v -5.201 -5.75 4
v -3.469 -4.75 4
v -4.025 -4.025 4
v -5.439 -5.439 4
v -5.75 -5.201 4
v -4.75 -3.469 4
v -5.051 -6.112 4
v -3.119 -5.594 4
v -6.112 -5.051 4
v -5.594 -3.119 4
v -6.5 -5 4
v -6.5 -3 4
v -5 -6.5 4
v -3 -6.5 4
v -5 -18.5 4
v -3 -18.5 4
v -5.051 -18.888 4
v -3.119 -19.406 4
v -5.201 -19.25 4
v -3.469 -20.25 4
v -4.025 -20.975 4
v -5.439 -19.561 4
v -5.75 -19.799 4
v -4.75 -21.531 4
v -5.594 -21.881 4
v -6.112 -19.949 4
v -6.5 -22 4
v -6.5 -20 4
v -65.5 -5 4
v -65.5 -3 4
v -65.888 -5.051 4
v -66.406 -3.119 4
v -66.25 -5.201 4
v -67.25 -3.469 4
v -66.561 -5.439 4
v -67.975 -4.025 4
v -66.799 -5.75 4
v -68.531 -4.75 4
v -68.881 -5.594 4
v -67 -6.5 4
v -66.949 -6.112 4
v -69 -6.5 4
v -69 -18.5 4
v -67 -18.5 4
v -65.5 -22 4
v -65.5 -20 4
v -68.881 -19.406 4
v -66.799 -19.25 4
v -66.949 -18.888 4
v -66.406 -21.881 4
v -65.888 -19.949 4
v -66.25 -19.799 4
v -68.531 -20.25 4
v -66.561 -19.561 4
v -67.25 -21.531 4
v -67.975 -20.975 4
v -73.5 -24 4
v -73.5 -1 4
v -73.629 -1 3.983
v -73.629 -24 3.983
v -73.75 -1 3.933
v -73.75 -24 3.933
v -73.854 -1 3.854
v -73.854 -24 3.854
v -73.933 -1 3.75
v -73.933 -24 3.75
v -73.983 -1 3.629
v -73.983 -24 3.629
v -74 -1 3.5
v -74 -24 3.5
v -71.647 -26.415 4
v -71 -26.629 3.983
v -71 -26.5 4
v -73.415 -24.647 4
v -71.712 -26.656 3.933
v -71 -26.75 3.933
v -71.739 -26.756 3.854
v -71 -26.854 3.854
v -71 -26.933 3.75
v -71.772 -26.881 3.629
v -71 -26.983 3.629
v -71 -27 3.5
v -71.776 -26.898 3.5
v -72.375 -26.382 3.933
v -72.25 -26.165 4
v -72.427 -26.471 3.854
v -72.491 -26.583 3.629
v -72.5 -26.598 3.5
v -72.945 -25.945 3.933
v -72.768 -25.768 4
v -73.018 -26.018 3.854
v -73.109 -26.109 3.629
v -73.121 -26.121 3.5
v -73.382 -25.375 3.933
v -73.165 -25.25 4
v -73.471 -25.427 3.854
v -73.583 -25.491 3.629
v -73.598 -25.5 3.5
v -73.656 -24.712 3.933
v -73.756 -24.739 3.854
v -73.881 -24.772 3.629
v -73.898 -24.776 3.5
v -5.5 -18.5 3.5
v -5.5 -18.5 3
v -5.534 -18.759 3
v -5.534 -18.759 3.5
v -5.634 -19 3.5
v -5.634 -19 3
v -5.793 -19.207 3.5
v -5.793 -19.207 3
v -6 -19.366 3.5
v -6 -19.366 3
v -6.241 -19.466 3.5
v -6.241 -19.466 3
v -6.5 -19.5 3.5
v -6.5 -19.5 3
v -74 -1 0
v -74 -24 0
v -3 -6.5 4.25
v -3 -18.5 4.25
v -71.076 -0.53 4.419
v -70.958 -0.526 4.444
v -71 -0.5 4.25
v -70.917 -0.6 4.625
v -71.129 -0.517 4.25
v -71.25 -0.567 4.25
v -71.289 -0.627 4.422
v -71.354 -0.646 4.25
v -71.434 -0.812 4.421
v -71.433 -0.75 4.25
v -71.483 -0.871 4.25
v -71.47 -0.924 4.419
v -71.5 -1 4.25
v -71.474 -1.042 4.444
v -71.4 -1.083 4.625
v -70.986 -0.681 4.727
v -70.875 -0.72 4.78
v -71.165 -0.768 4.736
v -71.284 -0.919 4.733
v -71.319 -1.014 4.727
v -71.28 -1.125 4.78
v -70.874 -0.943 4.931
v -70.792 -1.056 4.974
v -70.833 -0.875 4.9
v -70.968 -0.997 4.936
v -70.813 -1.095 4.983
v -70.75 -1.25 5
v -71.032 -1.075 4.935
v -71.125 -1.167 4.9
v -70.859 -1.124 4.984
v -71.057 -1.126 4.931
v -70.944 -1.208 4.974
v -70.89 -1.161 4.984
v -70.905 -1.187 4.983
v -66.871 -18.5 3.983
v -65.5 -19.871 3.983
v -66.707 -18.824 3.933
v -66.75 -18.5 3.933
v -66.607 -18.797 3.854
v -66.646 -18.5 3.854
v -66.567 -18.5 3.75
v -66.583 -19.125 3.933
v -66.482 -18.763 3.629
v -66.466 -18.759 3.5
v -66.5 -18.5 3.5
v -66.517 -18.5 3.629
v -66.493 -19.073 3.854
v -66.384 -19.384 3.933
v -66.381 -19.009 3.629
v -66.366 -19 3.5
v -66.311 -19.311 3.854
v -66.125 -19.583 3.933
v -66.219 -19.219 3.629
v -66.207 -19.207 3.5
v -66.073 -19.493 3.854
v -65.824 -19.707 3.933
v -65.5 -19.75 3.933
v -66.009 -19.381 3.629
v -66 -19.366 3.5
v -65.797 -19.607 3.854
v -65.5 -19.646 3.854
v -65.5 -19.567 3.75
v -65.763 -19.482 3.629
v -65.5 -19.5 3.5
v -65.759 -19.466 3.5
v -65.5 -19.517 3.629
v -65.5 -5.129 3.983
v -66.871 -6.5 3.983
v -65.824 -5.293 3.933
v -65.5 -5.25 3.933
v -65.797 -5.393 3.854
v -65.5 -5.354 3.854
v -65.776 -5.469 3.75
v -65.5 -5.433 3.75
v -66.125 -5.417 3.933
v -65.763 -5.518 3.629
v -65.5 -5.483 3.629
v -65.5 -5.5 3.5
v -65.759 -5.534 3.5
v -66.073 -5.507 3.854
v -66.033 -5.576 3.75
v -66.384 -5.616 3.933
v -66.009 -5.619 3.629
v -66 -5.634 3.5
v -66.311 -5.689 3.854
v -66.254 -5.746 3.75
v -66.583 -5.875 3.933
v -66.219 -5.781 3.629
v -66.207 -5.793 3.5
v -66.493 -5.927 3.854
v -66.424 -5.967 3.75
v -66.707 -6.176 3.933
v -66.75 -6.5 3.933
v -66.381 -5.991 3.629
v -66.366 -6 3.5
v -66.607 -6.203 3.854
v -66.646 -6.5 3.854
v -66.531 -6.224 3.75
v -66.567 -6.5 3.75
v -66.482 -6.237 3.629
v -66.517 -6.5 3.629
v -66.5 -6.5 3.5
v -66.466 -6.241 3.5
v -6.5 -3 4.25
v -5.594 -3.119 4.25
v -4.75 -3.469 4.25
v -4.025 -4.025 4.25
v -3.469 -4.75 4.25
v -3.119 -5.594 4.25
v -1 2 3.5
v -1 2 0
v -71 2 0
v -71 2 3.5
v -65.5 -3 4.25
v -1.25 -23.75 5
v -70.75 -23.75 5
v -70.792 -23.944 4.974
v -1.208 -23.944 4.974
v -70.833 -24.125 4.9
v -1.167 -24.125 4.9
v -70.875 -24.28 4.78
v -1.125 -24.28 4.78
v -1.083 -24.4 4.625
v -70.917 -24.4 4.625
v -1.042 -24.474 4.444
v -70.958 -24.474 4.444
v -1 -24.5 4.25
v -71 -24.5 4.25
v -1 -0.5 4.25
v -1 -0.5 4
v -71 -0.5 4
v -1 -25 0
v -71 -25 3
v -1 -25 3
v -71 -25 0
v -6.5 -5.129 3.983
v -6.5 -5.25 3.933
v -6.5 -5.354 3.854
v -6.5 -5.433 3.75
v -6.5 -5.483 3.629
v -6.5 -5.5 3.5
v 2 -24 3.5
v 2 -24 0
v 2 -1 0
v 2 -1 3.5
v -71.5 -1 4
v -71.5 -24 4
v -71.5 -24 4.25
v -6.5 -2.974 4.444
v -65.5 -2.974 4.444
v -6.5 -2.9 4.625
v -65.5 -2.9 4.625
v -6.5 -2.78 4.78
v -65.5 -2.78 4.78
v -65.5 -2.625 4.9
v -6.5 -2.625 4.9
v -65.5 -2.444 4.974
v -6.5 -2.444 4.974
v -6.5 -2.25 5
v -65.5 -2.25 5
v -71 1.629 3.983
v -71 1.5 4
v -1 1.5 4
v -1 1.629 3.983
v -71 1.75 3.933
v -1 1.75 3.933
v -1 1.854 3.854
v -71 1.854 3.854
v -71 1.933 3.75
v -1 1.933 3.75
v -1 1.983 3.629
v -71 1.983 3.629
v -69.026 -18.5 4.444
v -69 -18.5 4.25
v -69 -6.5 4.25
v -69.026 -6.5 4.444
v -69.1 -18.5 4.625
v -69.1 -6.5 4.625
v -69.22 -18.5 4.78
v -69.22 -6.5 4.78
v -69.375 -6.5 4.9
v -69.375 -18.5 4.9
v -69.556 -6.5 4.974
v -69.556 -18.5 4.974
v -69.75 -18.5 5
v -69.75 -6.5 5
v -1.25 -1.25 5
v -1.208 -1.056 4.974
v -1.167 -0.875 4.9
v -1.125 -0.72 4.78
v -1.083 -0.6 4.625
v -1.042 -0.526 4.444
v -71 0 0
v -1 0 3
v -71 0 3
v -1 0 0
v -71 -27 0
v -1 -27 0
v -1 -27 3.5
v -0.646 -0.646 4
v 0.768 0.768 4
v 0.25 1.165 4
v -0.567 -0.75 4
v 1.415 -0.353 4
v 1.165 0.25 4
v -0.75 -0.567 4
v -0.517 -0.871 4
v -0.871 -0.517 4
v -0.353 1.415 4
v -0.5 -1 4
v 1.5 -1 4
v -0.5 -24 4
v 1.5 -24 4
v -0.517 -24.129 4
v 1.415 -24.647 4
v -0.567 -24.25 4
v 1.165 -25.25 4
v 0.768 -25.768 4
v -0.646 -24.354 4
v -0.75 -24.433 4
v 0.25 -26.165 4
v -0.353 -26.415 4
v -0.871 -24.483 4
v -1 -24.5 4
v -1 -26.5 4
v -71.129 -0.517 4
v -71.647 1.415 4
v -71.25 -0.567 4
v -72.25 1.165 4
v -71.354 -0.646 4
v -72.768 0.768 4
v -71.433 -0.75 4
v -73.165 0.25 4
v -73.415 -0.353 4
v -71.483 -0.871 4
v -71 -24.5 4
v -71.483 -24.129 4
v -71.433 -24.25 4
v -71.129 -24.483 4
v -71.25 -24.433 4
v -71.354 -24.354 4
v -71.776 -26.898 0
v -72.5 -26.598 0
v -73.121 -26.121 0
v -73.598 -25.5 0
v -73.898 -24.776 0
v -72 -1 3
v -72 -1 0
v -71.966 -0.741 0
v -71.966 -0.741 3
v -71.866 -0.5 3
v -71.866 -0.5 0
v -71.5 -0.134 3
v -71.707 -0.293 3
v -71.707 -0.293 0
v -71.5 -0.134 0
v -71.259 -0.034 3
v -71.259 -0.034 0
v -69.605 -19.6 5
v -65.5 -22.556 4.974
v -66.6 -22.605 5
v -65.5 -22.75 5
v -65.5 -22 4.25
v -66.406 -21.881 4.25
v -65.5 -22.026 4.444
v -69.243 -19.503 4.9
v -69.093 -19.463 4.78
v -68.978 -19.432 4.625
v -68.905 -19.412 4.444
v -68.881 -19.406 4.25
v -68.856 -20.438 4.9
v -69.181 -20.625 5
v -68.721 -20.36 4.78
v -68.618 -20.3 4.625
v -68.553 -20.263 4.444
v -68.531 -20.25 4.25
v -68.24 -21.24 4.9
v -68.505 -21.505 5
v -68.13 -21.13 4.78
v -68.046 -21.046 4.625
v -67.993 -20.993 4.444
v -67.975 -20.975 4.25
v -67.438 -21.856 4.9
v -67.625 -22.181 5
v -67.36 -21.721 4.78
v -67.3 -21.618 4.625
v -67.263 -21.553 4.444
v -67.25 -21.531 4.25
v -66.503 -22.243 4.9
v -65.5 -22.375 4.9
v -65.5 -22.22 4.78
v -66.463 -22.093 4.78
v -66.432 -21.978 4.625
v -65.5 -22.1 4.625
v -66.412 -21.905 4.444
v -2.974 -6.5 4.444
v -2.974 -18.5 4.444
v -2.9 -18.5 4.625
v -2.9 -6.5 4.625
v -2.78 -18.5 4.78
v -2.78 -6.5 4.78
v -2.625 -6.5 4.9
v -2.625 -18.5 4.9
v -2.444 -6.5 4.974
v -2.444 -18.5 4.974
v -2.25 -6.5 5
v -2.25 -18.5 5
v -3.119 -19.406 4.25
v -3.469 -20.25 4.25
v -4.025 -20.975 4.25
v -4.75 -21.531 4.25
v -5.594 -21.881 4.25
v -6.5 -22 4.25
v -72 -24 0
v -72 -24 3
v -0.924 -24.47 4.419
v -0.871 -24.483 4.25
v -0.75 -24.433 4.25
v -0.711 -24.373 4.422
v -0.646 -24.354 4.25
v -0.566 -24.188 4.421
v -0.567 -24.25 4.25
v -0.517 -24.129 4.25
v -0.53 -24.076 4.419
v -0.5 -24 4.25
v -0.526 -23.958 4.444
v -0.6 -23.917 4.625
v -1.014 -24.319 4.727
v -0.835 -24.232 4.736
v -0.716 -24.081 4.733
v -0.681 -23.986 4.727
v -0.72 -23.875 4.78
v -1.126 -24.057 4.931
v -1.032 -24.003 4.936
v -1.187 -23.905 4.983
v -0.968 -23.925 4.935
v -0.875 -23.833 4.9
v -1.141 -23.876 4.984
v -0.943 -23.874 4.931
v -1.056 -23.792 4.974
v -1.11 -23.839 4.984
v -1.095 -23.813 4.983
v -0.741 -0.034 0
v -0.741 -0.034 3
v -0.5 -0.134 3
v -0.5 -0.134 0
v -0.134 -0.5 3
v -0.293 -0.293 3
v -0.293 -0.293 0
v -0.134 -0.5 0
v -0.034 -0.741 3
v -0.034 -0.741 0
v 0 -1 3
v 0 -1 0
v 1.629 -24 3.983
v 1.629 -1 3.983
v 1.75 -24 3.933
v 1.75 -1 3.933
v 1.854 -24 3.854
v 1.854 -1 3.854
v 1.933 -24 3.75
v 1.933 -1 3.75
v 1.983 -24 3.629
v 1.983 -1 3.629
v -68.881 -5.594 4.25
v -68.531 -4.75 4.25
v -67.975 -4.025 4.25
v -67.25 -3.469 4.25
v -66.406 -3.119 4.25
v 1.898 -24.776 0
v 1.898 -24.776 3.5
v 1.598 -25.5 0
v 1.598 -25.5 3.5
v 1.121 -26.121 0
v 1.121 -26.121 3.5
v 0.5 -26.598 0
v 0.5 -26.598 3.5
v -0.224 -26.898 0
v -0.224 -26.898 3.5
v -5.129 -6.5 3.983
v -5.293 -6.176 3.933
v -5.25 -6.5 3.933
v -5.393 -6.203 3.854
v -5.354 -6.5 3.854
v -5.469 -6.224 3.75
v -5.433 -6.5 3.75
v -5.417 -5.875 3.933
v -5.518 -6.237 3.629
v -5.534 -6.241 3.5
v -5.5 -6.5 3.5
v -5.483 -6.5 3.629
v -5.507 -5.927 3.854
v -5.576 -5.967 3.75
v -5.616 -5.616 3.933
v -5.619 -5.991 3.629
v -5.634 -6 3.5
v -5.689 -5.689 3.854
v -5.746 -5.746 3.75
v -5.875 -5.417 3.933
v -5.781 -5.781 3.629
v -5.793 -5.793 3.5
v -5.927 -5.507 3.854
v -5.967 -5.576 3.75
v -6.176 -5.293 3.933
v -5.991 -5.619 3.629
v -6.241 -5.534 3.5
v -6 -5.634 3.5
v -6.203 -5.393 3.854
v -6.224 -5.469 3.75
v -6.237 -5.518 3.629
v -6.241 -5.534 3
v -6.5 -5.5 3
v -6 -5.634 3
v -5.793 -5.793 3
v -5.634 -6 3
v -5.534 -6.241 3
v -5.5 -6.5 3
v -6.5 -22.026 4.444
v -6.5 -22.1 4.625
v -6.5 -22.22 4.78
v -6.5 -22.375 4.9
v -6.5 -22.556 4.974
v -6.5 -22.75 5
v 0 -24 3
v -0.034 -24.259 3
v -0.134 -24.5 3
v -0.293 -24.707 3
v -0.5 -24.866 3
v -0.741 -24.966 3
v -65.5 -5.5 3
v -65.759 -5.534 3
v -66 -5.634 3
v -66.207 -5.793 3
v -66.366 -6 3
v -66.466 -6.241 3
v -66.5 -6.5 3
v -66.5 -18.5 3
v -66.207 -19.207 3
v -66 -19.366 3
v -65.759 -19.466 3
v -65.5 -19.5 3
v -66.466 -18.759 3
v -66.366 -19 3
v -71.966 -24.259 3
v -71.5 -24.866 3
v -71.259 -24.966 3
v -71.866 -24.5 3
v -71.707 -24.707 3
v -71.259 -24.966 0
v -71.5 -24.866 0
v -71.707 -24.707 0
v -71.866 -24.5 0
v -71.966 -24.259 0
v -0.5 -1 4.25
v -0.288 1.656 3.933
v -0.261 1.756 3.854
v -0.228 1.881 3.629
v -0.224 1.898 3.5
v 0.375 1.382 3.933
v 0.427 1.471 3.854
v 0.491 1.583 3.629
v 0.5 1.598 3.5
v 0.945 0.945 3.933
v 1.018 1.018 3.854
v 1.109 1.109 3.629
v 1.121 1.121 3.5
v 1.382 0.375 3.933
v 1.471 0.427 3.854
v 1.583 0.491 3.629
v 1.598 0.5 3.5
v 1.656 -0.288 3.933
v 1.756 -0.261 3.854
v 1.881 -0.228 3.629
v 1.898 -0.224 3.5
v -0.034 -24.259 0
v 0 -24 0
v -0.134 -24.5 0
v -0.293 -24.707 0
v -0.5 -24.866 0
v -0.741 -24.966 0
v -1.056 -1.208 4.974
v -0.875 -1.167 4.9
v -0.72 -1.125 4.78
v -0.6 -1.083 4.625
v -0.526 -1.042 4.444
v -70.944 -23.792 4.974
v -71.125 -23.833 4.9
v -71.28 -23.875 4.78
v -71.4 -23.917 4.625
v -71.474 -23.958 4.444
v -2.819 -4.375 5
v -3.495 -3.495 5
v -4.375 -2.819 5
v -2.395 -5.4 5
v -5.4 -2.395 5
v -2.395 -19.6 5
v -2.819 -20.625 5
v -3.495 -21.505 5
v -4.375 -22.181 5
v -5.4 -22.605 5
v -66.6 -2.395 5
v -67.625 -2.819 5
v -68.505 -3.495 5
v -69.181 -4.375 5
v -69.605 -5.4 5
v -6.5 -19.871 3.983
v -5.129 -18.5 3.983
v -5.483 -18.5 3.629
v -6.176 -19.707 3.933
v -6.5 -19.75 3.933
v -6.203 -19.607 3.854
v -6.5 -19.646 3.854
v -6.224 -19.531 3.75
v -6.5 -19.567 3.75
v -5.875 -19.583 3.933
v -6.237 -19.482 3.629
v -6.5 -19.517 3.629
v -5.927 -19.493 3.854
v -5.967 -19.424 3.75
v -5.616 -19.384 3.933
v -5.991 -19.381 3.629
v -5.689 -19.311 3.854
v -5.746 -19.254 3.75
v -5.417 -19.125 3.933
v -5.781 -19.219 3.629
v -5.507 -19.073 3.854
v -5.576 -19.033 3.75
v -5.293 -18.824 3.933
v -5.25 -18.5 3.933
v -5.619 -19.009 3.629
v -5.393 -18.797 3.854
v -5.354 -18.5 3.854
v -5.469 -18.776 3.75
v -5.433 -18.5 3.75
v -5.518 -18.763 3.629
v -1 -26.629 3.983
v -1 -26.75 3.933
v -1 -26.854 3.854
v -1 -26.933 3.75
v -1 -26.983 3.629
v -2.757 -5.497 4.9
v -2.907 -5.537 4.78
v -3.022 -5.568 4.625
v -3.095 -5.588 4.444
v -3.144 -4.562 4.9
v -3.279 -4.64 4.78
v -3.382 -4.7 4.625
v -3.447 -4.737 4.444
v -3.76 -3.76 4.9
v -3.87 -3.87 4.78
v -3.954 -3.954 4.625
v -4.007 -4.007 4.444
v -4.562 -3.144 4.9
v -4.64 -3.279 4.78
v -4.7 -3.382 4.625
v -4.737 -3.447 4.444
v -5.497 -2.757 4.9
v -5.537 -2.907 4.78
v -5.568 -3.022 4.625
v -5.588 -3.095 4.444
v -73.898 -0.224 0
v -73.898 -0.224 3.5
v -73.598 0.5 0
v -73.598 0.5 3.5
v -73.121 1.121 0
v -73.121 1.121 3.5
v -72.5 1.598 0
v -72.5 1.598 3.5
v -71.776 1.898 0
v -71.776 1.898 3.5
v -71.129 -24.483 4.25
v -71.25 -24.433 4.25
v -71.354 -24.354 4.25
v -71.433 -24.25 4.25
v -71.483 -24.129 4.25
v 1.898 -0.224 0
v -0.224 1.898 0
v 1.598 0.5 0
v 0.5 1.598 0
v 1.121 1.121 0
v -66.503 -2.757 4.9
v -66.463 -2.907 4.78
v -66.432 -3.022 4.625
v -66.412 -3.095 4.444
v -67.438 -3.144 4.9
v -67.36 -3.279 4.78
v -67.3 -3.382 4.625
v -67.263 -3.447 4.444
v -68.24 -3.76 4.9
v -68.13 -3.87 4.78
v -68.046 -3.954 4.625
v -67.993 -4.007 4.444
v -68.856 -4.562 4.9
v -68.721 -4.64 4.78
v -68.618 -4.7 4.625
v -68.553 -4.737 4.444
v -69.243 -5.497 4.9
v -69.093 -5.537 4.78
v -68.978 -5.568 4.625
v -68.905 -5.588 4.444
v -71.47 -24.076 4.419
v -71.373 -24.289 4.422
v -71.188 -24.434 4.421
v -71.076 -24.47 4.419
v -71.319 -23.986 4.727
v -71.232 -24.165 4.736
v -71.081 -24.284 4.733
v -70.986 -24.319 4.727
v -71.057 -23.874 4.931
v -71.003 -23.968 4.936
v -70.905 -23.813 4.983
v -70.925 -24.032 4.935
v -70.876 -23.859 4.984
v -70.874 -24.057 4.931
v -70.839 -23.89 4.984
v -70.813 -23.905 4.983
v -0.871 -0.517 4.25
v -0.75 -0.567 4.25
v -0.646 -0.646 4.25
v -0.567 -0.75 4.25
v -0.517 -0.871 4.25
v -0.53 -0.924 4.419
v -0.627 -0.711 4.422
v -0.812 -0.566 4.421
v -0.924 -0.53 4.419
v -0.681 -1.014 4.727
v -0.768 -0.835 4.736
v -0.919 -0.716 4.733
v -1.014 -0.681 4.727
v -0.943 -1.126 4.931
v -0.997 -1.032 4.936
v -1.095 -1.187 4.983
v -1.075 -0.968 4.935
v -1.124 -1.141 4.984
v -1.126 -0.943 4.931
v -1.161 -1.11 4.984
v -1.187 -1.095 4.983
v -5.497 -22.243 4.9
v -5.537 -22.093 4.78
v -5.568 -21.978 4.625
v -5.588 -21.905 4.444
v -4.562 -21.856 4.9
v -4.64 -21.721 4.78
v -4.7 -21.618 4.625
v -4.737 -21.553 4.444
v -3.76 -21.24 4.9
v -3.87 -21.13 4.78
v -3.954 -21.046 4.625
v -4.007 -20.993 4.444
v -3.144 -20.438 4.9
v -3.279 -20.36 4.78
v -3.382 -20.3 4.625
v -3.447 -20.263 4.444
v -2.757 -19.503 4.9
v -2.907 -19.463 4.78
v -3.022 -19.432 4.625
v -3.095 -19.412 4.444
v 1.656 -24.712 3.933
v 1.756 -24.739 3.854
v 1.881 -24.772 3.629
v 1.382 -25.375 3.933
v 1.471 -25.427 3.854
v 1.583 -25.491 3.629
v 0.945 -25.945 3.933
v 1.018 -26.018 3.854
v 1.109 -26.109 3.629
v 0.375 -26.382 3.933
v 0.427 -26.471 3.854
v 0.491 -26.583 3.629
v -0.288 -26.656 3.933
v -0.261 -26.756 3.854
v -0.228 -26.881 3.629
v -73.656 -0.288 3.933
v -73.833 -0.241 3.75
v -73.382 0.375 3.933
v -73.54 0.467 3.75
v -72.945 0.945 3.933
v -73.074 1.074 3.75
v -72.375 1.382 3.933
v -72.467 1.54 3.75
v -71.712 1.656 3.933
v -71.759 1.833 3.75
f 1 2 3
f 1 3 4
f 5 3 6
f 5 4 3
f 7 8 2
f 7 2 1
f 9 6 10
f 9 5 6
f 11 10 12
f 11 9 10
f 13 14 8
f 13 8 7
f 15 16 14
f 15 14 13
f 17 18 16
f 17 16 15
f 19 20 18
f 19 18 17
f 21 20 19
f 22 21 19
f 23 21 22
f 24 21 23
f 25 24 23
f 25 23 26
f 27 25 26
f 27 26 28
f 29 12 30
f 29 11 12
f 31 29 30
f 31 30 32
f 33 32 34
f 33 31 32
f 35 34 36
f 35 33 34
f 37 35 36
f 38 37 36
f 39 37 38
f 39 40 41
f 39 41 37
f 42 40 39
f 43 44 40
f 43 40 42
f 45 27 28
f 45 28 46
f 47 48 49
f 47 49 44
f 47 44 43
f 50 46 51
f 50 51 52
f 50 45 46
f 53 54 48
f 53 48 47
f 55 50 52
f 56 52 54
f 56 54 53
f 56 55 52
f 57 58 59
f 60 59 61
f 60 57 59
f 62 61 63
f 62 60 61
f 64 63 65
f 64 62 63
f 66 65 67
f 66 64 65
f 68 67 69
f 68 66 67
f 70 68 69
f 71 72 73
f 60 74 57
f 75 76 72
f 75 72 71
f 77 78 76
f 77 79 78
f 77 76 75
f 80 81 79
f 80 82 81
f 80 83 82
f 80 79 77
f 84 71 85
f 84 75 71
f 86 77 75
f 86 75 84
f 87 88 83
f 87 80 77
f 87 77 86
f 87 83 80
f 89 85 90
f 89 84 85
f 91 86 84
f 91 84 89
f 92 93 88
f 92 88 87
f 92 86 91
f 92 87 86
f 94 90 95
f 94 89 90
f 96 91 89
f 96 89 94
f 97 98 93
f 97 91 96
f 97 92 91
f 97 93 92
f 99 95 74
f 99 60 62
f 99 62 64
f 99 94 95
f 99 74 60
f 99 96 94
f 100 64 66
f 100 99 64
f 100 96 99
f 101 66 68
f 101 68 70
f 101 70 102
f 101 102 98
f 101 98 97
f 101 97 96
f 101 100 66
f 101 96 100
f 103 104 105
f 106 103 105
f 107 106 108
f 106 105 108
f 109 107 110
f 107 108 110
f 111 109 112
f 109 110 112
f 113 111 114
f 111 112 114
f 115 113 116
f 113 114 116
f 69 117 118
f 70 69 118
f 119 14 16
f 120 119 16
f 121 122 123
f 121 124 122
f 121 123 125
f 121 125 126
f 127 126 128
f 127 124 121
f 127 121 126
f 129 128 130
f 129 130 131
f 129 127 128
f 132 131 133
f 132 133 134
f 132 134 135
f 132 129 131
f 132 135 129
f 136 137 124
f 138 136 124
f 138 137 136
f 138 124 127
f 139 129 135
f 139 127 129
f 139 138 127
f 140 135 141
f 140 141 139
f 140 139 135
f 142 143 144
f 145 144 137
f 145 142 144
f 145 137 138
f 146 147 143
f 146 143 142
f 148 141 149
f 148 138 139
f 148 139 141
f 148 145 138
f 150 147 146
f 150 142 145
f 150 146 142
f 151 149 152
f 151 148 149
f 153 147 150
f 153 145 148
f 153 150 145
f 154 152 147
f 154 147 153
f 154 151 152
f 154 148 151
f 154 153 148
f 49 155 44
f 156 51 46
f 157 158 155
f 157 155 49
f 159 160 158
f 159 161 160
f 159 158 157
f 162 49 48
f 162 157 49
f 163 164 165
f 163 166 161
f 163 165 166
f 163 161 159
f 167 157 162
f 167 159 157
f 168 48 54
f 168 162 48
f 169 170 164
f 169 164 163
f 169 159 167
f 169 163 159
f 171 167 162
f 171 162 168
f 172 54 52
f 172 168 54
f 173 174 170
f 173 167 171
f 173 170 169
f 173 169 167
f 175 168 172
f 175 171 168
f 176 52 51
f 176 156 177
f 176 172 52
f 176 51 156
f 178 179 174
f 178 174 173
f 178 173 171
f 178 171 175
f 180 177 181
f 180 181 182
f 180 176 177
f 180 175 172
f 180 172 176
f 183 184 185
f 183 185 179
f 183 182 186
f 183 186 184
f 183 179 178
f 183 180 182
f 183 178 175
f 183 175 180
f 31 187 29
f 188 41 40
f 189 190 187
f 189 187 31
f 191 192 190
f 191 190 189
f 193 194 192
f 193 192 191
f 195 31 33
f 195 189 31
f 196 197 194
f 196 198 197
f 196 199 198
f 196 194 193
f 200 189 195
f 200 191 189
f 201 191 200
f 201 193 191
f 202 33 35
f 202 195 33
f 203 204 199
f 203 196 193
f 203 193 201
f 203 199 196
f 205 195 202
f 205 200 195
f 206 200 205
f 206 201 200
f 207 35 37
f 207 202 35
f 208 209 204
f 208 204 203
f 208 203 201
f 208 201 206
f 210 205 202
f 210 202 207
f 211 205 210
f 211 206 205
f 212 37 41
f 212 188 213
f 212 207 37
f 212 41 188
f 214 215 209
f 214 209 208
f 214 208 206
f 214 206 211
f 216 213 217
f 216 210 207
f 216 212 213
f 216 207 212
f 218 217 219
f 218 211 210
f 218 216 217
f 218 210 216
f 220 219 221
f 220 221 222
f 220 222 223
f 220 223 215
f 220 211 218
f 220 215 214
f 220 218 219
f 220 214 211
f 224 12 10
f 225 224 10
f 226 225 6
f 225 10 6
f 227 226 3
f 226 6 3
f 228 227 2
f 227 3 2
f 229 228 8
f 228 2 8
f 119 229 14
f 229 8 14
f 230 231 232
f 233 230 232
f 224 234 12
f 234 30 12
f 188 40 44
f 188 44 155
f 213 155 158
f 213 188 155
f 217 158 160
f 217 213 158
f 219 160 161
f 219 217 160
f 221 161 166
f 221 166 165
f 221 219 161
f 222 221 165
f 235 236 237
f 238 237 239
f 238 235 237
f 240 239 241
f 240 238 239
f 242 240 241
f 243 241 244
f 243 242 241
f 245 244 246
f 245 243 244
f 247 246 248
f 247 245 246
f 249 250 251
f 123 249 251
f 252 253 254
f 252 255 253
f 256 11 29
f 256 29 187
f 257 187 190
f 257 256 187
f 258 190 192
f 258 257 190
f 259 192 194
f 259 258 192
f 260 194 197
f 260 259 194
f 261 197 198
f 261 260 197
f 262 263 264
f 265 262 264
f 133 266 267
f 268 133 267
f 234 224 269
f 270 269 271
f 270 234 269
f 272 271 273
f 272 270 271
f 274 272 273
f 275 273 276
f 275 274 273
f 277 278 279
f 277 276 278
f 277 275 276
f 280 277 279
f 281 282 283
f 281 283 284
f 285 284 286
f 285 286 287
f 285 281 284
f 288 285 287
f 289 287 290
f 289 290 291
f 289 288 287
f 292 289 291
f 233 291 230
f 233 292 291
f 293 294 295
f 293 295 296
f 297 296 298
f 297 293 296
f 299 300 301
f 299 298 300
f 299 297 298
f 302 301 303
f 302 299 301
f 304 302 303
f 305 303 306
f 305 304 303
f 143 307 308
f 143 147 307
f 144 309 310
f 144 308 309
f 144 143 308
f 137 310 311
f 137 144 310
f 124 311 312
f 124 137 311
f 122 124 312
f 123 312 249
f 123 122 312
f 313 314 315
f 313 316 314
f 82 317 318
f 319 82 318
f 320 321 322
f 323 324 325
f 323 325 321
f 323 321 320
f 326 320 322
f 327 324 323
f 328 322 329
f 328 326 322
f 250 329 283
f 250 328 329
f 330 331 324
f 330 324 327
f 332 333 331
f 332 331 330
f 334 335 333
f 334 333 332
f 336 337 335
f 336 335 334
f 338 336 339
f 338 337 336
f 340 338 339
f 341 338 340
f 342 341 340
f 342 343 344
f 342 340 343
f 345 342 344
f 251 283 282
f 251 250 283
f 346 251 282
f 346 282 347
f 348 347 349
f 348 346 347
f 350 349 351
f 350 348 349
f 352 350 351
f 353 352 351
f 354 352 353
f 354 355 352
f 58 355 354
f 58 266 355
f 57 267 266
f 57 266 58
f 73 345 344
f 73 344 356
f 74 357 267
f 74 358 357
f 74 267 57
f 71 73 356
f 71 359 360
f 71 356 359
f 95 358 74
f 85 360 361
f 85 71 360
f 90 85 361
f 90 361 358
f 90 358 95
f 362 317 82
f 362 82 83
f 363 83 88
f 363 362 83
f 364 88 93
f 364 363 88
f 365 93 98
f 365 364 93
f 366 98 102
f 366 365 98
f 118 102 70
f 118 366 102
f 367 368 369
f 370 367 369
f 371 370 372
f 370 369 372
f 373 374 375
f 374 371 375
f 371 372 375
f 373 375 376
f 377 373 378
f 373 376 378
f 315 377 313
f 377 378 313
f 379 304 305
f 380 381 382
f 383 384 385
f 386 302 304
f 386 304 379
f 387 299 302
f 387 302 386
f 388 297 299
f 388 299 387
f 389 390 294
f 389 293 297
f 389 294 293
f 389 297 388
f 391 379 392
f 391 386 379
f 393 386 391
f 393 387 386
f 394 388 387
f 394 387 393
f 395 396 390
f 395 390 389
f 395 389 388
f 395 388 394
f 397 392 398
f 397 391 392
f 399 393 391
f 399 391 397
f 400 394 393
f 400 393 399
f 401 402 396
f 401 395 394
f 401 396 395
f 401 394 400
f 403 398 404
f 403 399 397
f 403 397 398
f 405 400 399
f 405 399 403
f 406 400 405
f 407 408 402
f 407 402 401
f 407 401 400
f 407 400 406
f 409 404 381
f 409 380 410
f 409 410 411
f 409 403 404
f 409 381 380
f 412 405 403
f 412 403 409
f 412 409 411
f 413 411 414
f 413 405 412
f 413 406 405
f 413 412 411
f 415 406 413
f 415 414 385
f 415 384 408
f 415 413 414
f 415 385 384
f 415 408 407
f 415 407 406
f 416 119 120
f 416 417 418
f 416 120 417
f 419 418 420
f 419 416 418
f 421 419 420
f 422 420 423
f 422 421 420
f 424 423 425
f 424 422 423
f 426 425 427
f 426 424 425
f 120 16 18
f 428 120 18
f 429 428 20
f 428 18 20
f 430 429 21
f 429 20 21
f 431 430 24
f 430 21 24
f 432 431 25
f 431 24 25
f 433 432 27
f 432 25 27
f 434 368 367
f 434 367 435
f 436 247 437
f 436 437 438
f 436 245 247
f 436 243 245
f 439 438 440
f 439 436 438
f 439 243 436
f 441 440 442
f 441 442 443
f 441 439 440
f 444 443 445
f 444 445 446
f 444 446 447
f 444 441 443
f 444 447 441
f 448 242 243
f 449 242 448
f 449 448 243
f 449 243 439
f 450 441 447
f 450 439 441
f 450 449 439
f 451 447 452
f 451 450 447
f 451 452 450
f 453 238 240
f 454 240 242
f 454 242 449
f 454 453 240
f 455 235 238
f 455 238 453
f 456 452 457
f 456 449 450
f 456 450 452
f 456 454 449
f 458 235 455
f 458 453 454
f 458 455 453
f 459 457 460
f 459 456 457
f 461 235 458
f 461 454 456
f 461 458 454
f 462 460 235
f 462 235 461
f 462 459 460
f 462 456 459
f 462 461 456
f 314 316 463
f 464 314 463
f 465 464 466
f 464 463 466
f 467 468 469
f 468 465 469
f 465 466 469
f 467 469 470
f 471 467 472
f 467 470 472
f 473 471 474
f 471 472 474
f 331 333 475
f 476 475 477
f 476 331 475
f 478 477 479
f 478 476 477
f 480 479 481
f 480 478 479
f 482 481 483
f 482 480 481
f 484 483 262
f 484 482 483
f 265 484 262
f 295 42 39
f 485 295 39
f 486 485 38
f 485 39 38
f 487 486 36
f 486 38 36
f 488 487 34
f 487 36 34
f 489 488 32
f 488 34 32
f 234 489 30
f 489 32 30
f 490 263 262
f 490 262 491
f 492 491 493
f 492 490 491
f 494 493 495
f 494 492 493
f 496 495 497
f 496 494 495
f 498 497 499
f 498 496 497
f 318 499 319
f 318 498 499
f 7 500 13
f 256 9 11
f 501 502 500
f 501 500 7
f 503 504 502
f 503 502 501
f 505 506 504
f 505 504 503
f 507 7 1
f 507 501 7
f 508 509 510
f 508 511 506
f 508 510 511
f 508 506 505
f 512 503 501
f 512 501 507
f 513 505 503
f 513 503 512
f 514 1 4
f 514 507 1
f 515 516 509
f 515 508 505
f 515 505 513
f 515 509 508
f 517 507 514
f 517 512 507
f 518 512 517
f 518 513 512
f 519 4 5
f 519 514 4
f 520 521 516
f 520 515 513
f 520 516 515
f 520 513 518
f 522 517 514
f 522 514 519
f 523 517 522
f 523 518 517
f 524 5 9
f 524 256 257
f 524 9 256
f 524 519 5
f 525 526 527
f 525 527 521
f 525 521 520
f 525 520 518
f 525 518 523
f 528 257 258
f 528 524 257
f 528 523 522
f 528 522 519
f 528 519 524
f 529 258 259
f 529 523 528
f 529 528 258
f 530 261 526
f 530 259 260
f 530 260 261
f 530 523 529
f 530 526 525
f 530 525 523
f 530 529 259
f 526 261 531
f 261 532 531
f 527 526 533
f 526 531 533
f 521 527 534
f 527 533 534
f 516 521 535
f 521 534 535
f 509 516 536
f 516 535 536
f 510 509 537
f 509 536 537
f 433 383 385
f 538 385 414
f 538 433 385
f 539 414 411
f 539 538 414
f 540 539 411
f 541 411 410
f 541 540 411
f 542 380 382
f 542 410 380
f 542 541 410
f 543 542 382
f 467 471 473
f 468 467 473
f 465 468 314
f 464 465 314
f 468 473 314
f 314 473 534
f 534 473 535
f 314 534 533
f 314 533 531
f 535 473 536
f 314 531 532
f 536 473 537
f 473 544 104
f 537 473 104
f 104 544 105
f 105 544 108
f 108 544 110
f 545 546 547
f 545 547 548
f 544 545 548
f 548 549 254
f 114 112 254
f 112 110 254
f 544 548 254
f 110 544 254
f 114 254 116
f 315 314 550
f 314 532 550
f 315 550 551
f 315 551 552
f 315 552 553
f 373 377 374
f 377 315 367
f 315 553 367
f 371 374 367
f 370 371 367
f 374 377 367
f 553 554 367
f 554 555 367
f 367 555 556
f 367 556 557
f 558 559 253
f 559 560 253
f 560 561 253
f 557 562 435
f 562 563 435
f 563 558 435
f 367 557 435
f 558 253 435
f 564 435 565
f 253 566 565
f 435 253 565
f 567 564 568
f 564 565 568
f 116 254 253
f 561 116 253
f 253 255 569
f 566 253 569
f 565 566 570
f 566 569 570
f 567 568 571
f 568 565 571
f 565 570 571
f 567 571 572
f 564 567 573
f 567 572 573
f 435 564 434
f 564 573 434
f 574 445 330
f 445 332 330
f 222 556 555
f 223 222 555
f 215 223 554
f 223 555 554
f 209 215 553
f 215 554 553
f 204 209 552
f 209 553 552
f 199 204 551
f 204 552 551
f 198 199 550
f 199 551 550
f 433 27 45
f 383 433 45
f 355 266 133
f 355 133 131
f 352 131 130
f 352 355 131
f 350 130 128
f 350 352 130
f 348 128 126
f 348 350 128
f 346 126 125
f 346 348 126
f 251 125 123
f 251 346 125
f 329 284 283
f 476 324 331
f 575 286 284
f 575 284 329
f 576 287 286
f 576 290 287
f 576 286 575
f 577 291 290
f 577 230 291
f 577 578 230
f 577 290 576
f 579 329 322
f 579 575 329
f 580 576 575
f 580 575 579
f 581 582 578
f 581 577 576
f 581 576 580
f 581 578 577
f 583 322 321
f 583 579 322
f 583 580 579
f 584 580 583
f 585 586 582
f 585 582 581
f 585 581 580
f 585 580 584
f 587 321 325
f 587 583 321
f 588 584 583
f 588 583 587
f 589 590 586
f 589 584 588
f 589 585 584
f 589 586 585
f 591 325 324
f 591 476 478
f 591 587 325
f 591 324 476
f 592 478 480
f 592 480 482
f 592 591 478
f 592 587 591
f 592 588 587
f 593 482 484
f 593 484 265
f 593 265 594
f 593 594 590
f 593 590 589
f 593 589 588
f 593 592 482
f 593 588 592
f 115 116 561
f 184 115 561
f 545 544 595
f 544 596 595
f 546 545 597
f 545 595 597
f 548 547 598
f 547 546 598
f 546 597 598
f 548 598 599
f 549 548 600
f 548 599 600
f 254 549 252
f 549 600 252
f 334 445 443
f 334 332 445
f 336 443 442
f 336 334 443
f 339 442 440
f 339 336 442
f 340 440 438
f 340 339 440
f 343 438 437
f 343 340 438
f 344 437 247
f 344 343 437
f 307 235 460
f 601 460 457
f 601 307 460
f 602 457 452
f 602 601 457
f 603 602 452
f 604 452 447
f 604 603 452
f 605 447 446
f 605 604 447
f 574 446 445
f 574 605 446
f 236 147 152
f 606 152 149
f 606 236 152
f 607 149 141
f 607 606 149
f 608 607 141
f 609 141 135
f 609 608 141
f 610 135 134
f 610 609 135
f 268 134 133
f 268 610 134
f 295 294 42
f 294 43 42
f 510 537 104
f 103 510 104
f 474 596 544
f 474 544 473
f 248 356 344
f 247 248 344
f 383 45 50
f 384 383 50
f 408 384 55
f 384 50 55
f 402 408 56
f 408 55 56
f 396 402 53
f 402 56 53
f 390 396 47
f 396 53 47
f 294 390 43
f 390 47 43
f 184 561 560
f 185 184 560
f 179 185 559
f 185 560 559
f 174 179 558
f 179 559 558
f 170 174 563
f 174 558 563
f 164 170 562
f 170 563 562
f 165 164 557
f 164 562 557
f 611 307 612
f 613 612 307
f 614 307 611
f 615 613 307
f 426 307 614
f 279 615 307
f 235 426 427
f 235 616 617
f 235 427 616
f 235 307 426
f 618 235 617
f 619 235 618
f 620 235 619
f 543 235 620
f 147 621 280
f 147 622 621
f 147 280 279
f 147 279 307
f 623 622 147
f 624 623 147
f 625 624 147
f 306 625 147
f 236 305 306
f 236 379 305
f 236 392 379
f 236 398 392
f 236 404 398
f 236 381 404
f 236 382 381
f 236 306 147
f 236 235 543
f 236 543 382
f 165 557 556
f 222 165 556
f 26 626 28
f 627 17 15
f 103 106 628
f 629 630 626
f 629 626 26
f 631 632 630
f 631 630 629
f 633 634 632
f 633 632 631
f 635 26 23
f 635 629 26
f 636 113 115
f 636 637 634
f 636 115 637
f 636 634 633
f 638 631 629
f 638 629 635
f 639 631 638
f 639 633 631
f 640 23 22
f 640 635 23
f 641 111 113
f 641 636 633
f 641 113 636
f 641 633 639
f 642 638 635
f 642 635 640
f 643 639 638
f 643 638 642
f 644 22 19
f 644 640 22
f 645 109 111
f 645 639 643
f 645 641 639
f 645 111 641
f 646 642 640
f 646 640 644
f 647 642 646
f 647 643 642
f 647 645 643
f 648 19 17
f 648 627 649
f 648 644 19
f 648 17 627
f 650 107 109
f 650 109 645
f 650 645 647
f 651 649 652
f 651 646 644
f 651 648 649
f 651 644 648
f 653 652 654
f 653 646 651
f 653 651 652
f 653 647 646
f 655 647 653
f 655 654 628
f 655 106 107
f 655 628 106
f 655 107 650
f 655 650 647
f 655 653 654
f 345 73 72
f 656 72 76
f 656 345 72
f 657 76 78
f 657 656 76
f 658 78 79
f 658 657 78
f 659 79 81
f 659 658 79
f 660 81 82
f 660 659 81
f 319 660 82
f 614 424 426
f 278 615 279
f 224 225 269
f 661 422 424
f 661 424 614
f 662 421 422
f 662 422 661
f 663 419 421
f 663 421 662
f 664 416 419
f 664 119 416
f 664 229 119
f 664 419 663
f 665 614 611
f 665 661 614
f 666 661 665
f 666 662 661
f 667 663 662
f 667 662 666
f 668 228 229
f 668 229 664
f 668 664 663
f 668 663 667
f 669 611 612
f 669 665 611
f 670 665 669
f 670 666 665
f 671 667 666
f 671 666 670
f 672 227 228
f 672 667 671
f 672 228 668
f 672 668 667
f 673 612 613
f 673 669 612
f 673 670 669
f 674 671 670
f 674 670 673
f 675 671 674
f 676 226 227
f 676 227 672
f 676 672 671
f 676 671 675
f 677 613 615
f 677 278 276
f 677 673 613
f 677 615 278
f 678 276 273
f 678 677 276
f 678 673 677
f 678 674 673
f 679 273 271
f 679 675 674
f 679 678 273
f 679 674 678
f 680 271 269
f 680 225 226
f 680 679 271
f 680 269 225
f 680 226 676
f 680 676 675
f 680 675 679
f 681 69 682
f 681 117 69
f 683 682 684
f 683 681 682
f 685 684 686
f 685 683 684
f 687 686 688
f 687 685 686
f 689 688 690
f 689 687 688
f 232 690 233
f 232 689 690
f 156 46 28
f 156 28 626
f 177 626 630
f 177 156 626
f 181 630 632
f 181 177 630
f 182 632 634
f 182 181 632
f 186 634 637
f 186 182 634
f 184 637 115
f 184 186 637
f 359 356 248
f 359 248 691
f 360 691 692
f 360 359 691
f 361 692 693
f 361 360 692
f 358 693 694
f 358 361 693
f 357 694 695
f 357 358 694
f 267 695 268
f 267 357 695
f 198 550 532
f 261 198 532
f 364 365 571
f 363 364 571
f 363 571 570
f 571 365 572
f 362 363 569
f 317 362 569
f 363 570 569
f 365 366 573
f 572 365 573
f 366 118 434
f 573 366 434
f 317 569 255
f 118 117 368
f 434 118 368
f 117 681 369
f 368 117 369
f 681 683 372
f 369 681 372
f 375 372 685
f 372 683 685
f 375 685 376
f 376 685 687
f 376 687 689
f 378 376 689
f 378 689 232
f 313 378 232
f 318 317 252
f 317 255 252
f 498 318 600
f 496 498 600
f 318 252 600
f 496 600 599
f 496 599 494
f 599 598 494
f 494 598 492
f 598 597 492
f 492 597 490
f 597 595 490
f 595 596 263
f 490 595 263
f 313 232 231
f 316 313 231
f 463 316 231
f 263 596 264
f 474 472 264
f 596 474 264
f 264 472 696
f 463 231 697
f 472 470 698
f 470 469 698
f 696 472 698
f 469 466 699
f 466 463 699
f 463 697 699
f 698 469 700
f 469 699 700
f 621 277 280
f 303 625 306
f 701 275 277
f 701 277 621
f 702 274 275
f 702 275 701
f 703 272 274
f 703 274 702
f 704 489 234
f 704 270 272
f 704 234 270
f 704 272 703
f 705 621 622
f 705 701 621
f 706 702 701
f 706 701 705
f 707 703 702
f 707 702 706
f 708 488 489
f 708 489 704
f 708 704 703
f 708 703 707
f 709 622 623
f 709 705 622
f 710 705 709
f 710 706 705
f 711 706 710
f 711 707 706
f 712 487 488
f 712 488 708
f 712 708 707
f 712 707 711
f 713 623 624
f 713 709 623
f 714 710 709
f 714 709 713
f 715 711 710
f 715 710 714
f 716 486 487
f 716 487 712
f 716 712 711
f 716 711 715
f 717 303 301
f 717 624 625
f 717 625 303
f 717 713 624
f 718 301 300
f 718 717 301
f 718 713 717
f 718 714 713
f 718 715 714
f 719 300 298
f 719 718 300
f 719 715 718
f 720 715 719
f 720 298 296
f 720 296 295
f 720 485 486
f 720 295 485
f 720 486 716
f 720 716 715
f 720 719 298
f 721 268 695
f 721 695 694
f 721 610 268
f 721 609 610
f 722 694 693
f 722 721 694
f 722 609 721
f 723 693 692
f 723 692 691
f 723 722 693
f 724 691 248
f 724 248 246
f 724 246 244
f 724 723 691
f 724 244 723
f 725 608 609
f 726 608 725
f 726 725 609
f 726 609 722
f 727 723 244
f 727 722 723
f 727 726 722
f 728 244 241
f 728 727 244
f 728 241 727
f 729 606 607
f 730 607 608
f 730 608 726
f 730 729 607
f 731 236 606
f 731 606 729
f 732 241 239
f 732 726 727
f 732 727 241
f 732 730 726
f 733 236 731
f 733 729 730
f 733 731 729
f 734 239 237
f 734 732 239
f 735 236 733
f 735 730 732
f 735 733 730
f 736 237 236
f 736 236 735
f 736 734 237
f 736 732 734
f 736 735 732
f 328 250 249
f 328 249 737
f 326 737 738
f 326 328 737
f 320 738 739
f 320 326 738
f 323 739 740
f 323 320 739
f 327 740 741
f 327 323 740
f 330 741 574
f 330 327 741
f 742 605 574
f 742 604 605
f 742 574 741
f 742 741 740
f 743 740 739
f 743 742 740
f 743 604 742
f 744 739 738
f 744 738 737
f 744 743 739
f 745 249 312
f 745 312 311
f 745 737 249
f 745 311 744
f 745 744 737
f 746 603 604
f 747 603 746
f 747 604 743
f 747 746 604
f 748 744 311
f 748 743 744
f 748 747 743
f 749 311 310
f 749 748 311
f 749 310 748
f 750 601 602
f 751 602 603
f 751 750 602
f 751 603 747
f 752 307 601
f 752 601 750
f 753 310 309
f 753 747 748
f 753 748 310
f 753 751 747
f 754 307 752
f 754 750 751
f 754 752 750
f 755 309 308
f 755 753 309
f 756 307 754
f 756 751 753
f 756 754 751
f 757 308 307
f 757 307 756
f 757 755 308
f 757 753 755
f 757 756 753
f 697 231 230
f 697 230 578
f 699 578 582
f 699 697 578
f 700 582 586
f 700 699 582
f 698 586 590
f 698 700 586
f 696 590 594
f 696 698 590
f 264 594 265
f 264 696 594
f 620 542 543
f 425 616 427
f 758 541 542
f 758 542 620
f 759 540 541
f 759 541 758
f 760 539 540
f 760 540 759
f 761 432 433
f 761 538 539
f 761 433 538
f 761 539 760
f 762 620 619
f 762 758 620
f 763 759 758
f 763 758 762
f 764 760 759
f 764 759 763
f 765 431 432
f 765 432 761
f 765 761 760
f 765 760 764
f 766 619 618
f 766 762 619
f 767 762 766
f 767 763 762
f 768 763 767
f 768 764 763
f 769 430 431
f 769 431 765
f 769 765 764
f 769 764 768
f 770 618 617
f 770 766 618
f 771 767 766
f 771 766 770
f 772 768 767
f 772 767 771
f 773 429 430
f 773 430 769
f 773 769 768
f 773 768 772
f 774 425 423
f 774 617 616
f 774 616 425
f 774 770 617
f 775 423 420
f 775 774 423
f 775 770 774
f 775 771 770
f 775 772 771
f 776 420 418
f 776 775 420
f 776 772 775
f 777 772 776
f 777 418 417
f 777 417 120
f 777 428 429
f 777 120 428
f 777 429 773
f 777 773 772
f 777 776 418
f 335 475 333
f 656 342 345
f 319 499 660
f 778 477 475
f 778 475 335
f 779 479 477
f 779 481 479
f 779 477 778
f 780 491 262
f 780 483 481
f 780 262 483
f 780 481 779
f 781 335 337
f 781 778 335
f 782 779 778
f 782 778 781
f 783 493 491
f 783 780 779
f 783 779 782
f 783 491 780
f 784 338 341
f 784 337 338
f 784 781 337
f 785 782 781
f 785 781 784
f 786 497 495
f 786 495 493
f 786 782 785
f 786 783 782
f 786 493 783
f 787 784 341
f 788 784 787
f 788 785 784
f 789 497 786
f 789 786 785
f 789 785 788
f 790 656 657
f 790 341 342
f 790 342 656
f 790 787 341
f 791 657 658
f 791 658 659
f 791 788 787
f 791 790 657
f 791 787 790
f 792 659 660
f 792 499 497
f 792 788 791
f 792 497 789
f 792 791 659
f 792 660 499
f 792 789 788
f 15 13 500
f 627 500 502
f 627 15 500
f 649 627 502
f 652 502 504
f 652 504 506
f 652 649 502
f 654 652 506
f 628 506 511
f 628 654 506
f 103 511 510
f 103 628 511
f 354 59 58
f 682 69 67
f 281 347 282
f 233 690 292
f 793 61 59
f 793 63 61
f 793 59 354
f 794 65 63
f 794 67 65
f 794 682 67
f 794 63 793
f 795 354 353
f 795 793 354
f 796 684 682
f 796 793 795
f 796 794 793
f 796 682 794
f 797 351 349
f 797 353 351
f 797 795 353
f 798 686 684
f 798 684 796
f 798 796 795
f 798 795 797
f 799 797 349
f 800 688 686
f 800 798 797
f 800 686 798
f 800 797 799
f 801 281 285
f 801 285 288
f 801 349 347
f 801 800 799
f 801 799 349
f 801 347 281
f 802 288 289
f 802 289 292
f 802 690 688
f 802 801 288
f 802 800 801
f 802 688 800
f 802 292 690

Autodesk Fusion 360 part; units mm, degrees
sketch "Sketch1" plane through (0, 0, 0) normal (0, 0, 1) x (1, 0, 0)
  line L0 (-1, 0) -> (-71, 0)
  line L1 (-72, -1) -> (-72, -24)
  line L2 (-71, -25) -> (-1, -25)
  line L3 (0, -24) -> (0, -1)
  arc A0 (-1, -25) -> (0, -24) centre (-1, -24) ccw
  arc A1 (-72, -24) -> (-71, -25) centre (-71, -24) ccw
  arc A2 (-71, 0) -> (-72, -1) centre (-71, -1) ccw
  arc A3 (0, -1) -> (-1, 0) centre (-1, -1) ccw
  line L4 (2, -24) -> (2, -1)
  arc A4 (2, -1) -> (-1, 2) centre (-1, -1) ccw
  line L5 (-1, 2) -> (-71, 2)
  arc A5 (-71, 2) -> (-74, -1) centre (-71, -1) ccw
  line L6 (-74, -1) -> (-74, -24)
  arc A6 (-74, -24) -> (-71, -27) centre (-71, -24) ccw
  line L7 (-71, -27) -> (-1, -27)
  arc A7 (-1, -27) -> (2, -24) centre (-1, -24) ccw
  point P0 (-72, 0)
  point P1 (0, -25)
  dimension "d1" = 72
  dimension "d2" = 25
  dimension "d3" = 1
  dimension "d4" = 2
extrude "Extrude1" add sketch "Sketch1" along normal blind 3
sketch "Sketch2" plane through (0, 0, 3) normal (0, 0, 1) x (-1, 0, 0)
  arc A0 (0, 1) -> (1, 0) centre (1, 1) ccw
  line L0 (0, 1) -> (0, 24)
  arc A1 (1, 25) -> (0, 24) centre (1, 24) ccw
  line L1 (1, 25) -> (71, 25)
  arc A2 (72, 24) -> (71, 25) centre (71, 24) ccw
  line L2 (72, 24) -> (72, 1)
  arc A3 (71, 0) -> (72, 1) centre (71, 1) ccw
  line L3 (71, 0) -> (1, 0)
  arc A4 (1, 27) -> (-2, 24) centre (1, 24) ccw
  line L4 (-2, 24) -> (-2, 1)
  arc A5 (-2, 1) -> (1, -2) centre (1, 1) ccw
  line L5 (1, -2) -> (71, -2)
  arc A6 (71, -2) -> (74, 1) centre (71, 1) ccw
  line L6 (74, 1) -> (74, 24)
  arc A7 (74, 24) -> (71, 27) centre (71, 24) ccw
  line L7 (71, 27) -> (1, 27)
  line L8 (71, 27) -> (1, 27)
  line L9 (6.5, 19.5) -> (65.5, 19.5)
  line L10 (5.5, 6.5) -> (5.5, 18.5)
  line L11 (65.5, 5.5) -> (6.5, 5.5)
  line L12 (66.5, 18.5) -> (66.5, 6.5)
  arc A8 (6.5, 19.5) -> (5.5, 18.5) centre (6.5, 18.5) ccw
  arc A9 (66.5, 18.5) -> (65.5, 19.5) centre (65.5, 18.5) ccw
  arc A10 (65.5, 5.5) -> (66.5, 6.5) centre (65.5, 6.5) ccw
  arc A11 (5.5, 6.5) -> (6.5, 5.5) centre (6.5, 6.5) ccw
  dimension "d8" = 1
extrude "Extrude2" add sketch "Sketch2" along normal blind 1 contours A0 L0 A1 L1 A2 L2 A3 L3 | A4 L4 A5 L5 A6 L6 A7 L7 L8
fillet "Fillet1" radius 0.5 8 edges at (-66.5, -12.5, 4) (-66.2071, -5.7929, 4) (-36, -5.5, 4) (-5.7929, -5.7929, 4) (-5.5, -12.5, 4) (-5.7929, -19.2071, 4) (-36, -19.5, 4) (-66.2071, -19.2071, 4)
fillet "Fillet2" radius 0.5 8 edges at (-73.1213, 1.1213, 4) (-74, -12.5, 4) (-73.1213, -26.1213, 4) (-36, -27, 4) (1.1213, -26.1213, 4) (2, -12.5, 4) (1.1213, 1.1213, 4) (-36, 2, 4)
sketch "Sketch3" plane through (0, 0, 4) normal (0, 0, 1) x (-1, 0, 0)
  line L0 (67, 18.5) -> (67, 6.5)
  arc A0 (65.5, 5) -> (67, 6.5) centre (65.5, 6.5) ccw
  line L1 (65.5, 5) -> (6.5, 5)
  arc A1 (5, 6.5) -> (6.5, 5) centre (6.5, 6.5) ccw
  line L2 (5, 6.5) -> (5, 18.5)
  arc A2 (6.5, 20) -> (5, 18.5) centre (6.5, 18.5) ccw
  line L3 (6.5, 20) -> (65.5, 20)
  arc A3 (67, 18.5) -> (65.5, 20) centre (65.5, 18.5) ccw
  arc A4 (71, -1.5) -> (73.5, 1) centre (71, 1) ccw
  line L4 (73.5, 1) -> (73.5, 24)
  arc A5 (73.5, 24) -> (71, 26.5) centre (71, 24) ccw
  line L5 (71, 26.5) -> (1, 26.5)
  arc A6 (1, 26.5) -> (-1.5, 24) centre (1, 24) ccw
  line L6 (-1.5, 24) -> (-1.5, 1)
  arc A7 (-1.5, 1) -> (1, -1.5) centre (1, 1) ccw
  line L7 (1, -1.5) -> (71, -1.5)
  line L8 (0.5, 24) -> (0.5, 1)
  arc A8 (0.5, 1) -> (1, 0.5) centre (1, 1) ccw
  line L9 (1, 0.5) -> (71, 0.5)
  arc A9 (71, 0.5) -> (71.5, 1) centre (71, 1) ccw
  line L10 (71.5, 1) -> (71.5, 24)
  arc A10 (71.5, 24) -> (71, 24.5) centre (71, 24) ccw
  line L11 (71, 24.5) -> (1, 24.5)
  arc A11 (1, 24.5) -> (0.5, 24) centre (1, 24) ccw
  arc A12 (3, 6.5) -> (6.5, 3) centre (6.5, 6.5) ccw
  line L12 (65.5, 3) -> (6.5, 3)
  arc A13 (65.5, 3) -> (69, 6.5) centre (65.5, 6.5) ccw
  line L13 (69, 18.5) -> (69, 6.5)
  arc A14 (69, 18.5) -> (65.5, 22) centre (65.5, 18.5) ccw
  line L14 (6.5, 22) -> (65.5, 22)
  arc A15 (6.5, 22) -> (3, 18.5) centre (6.5, 18.5) ccw
  line L15 (3, 6.5) -> (3, 18.5)
  dimension "d15" = -2
  dimension "d16" = -2
extrude "Extrude3" add sketch "Sketch3" along normal blind 1 contours L8 A8 L9 A9 L10 A10 L11 A11
fillet "Fillet3" radius 0.75 16 edges at (-67.9749, -20.9749, 5) (-69, -12.5, 5) (-67.9749, -4.0251, 5) (-36, -3, 5) (-4.0251, -4.0251, 5) (-3, -12.5, 5) (-4.0251, -20.9749, 5) (-36, -22, 5) (-36, -0.5, 5) (-71.3536, -0.6464, 5) (-71.5, -12.5, 5) (-71.3536, -24.3536, 5) (-36, -24.5, 5) (-0.6464, -24.3536, 5) (-0.5, -12.5, 5) (-0.6464, -0.6464, 5)
